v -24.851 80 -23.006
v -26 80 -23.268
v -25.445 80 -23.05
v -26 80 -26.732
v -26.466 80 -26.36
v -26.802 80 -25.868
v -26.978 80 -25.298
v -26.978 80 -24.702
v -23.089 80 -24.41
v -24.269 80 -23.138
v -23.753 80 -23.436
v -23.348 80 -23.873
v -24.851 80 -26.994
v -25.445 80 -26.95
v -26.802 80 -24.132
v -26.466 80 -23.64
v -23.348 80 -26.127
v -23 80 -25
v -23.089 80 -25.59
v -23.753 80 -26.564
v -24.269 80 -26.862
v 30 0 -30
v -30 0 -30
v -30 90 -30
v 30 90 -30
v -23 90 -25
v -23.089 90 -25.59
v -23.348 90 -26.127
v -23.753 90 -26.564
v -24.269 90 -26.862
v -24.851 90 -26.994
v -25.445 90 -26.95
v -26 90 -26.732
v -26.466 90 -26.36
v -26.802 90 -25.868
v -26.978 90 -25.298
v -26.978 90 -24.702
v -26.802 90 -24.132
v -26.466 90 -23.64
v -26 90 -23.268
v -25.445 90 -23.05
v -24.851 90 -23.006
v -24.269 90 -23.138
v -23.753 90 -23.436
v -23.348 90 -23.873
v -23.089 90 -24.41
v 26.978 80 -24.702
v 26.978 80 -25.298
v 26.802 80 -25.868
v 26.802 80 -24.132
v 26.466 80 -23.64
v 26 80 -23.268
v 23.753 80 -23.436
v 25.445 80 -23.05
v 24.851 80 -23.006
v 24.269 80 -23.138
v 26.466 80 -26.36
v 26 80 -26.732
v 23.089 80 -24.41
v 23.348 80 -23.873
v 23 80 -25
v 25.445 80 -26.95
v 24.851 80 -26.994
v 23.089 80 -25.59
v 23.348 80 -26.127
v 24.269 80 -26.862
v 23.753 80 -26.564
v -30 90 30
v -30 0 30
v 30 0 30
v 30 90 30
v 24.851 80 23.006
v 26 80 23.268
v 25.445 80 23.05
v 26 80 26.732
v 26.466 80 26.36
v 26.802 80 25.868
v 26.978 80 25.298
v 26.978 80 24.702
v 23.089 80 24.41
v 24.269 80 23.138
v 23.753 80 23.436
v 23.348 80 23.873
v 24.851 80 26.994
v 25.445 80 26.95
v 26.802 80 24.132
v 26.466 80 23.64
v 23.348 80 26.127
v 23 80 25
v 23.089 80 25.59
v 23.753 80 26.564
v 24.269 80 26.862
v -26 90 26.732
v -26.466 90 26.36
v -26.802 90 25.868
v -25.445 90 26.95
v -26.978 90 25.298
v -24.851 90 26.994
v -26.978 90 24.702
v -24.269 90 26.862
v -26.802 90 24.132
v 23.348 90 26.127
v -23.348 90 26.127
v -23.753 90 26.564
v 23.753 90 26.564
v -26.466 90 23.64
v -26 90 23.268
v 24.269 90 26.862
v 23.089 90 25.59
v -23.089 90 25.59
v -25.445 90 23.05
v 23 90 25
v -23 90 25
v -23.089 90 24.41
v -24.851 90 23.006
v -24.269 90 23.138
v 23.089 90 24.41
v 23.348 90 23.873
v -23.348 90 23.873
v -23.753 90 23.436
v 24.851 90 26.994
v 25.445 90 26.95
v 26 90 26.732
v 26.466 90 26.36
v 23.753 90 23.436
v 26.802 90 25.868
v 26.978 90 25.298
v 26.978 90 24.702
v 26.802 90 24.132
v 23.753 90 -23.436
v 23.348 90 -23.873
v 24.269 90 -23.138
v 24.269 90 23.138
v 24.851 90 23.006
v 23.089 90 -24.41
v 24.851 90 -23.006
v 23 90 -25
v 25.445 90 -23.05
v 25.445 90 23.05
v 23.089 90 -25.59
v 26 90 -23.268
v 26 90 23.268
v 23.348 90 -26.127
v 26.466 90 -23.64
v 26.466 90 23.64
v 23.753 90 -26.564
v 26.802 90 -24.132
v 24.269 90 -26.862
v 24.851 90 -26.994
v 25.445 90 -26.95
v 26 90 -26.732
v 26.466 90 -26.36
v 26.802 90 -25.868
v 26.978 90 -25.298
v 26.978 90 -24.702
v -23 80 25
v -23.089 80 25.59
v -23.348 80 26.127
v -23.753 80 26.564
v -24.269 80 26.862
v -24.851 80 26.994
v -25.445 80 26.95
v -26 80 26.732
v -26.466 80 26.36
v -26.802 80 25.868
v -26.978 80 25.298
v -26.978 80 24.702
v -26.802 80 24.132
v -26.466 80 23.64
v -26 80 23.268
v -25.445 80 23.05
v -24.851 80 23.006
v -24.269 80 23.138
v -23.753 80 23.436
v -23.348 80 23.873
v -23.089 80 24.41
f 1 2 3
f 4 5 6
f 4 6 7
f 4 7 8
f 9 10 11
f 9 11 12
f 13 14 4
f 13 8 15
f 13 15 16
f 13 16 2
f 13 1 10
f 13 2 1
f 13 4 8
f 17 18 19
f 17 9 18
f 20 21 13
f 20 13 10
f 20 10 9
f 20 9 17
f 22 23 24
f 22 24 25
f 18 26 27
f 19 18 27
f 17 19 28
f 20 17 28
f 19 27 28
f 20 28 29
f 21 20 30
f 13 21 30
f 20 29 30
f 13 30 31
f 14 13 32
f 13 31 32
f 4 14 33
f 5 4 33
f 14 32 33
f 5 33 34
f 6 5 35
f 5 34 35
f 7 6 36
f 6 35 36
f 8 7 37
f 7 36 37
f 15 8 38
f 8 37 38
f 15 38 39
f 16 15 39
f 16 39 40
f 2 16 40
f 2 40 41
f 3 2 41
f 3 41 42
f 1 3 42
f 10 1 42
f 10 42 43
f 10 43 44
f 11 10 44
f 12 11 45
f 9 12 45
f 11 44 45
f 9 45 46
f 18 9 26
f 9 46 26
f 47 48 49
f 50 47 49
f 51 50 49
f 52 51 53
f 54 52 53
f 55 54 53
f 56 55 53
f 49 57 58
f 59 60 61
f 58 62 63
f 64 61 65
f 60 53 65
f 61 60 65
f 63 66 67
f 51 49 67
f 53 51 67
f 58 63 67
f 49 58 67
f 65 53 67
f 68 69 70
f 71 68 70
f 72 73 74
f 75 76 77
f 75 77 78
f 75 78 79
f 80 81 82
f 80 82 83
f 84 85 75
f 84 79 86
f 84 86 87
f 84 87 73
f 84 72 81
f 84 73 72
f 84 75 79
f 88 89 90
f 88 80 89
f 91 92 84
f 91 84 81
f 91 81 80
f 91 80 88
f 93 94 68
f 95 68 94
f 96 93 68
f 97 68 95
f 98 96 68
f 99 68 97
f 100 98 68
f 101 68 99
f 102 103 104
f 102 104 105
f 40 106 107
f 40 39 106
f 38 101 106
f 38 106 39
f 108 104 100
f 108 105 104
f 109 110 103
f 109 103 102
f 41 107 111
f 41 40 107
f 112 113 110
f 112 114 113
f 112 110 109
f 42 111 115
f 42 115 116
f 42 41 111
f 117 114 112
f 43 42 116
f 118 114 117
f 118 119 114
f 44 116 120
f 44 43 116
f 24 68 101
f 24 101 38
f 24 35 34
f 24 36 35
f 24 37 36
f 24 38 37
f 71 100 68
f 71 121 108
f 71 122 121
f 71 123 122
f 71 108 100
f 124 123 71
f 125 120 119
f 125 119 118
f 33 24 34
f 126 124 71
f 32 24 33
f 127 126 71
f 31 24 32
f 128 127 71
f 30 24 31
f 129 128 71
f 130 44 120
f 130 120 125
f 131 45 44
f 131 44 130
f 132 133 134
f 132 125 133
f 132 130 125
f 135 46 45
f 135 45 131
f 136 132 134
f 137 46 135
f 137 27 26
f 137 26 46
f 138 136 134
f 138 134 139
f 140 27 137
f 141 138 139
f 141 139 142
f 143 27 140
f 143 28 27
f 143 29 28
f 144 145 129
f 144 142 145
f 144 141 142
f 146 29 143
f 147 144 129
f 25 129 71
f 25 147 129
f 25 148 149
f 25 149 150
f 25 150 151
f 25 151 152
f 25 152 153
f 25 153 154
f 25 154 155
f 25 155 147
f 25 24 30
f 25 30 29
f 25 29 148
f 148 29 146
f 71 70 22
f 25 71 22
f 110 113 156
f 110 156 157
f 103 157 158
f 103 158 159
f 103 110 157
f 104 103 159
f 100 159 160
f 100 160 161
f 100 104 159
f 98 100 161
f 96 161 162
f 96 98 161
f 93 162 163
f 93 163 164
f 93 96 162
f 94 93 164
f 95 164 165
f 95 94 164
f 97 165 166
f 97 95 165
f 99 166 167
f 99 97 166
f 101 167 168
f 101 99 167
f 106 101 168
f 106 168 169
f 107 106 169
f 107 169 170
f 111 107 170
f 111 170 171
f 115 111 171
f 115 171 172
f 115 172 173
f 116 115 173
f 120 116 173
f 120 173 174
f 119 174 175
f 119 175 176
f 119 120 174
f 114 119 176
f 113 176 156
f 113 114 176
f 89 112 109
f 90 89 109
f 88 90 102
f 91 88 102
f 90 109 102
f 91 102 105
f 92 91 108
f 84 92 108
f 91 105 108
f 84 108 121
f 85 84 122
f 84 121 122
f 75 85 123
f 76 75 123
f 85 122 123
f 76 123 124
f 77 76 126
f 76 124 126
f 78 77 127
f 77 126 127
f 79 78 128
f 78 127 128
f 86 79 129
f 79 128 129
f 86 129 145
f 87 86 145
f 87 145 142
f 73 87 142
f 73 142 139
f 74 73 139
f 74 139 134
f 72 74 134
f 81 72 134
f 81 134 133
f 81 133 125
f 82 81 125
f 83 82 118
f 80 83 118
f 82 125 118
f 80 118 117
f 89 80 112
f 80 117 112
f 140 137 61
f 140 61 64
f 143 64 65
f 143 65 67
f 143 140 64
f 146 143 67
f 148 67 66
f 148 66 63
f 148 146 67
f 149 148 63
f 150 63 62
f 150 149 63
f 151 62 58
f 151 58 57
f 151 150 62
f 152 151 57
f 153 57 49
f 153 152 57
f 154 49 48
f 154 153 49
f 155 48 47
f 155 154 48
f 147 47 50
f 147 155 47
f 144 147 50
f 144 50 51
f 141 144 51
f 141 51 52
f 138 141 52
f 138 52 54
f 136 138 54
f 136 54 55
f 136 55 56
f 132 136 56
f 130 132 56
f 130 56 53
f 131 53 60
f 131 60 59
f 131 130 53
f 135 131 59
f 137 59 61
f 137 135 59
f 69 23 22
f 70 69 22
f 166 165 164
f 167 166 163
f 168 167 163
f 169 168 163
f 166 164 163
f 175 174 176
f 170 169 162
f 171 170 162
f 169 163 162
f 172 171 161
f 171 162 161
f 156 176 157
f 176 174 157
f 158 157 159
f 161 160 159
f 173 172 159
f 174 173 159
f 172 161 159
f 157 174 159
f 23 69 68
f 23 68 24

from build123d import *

# Parameters (mm, degrees)
SKETCH1_W               = 60
SKETCH1_H               = 60
BOSS_EXTRUDE1_DEPTH     = 90
SKETCH2_R               = 2
CUT_EXTRUDE1_DEPTH      = 10
MIRROR2_COPY_1_SKETCH_R = 2
MIRROR2_COPY_1_DEPTH    = 10


with BuildPart() as part:
    # Sketch1 → Boss-Extrude1 (new body)
    with BuildSketch(Plane(origin=(0, 0, 0), x_dir=(1, 0, 0), z_dir=(0, 1, 0))):
        Rectangle(SKETCH1_W, SKETCH1_H)
    extrude(amount=BOSS_EXTRUDE1_DEPTH)

    # Sketch2 → Cut-Extrude1 (cut)
    with BuildSketch(Plane(origin=(0, 90, 0), x_dir=(1, 0, 0), z_dir=(0, 1, 0))):
        with Locations((-25, 25)):
            Circle(SKETCH2_R)
    cut_extrude1 = extrude(amount=-CUT_EXTRUDE1_DEPTH, mode=Mode.SUBTRACT)

    # Mirror1: Cut-Extrude1 across plane
    add(cut_extrude1.mirror(Plane(origin=(0, 0, 0), x_dir=(0, 0, 1), z_dir=(1, 0, 0))), mode=Mode.SUBTRACT)

    # Mirror2: Cut-Extrude1 across plane
    add(cut_extrude1.mirror(Plane.XY), mode=Mode.SUBTRACT)

    # Mirror2 copy 1 sketch → Mirror2 copy 1 (cut)
    with BuildSketch(Plane(origin=(0, 90, 0), x_dir=(-1, 0, 0), z_dir=(0, 1, 0))):
        with Locations((-25, 25)):
            Circle(MIRROR2_COPY_1_SKETCH_R)
    extrude(amount=-MIRROR2_COPY_1_DEPTH, mode=Mode.SUBTRACT)


solid = part.part
